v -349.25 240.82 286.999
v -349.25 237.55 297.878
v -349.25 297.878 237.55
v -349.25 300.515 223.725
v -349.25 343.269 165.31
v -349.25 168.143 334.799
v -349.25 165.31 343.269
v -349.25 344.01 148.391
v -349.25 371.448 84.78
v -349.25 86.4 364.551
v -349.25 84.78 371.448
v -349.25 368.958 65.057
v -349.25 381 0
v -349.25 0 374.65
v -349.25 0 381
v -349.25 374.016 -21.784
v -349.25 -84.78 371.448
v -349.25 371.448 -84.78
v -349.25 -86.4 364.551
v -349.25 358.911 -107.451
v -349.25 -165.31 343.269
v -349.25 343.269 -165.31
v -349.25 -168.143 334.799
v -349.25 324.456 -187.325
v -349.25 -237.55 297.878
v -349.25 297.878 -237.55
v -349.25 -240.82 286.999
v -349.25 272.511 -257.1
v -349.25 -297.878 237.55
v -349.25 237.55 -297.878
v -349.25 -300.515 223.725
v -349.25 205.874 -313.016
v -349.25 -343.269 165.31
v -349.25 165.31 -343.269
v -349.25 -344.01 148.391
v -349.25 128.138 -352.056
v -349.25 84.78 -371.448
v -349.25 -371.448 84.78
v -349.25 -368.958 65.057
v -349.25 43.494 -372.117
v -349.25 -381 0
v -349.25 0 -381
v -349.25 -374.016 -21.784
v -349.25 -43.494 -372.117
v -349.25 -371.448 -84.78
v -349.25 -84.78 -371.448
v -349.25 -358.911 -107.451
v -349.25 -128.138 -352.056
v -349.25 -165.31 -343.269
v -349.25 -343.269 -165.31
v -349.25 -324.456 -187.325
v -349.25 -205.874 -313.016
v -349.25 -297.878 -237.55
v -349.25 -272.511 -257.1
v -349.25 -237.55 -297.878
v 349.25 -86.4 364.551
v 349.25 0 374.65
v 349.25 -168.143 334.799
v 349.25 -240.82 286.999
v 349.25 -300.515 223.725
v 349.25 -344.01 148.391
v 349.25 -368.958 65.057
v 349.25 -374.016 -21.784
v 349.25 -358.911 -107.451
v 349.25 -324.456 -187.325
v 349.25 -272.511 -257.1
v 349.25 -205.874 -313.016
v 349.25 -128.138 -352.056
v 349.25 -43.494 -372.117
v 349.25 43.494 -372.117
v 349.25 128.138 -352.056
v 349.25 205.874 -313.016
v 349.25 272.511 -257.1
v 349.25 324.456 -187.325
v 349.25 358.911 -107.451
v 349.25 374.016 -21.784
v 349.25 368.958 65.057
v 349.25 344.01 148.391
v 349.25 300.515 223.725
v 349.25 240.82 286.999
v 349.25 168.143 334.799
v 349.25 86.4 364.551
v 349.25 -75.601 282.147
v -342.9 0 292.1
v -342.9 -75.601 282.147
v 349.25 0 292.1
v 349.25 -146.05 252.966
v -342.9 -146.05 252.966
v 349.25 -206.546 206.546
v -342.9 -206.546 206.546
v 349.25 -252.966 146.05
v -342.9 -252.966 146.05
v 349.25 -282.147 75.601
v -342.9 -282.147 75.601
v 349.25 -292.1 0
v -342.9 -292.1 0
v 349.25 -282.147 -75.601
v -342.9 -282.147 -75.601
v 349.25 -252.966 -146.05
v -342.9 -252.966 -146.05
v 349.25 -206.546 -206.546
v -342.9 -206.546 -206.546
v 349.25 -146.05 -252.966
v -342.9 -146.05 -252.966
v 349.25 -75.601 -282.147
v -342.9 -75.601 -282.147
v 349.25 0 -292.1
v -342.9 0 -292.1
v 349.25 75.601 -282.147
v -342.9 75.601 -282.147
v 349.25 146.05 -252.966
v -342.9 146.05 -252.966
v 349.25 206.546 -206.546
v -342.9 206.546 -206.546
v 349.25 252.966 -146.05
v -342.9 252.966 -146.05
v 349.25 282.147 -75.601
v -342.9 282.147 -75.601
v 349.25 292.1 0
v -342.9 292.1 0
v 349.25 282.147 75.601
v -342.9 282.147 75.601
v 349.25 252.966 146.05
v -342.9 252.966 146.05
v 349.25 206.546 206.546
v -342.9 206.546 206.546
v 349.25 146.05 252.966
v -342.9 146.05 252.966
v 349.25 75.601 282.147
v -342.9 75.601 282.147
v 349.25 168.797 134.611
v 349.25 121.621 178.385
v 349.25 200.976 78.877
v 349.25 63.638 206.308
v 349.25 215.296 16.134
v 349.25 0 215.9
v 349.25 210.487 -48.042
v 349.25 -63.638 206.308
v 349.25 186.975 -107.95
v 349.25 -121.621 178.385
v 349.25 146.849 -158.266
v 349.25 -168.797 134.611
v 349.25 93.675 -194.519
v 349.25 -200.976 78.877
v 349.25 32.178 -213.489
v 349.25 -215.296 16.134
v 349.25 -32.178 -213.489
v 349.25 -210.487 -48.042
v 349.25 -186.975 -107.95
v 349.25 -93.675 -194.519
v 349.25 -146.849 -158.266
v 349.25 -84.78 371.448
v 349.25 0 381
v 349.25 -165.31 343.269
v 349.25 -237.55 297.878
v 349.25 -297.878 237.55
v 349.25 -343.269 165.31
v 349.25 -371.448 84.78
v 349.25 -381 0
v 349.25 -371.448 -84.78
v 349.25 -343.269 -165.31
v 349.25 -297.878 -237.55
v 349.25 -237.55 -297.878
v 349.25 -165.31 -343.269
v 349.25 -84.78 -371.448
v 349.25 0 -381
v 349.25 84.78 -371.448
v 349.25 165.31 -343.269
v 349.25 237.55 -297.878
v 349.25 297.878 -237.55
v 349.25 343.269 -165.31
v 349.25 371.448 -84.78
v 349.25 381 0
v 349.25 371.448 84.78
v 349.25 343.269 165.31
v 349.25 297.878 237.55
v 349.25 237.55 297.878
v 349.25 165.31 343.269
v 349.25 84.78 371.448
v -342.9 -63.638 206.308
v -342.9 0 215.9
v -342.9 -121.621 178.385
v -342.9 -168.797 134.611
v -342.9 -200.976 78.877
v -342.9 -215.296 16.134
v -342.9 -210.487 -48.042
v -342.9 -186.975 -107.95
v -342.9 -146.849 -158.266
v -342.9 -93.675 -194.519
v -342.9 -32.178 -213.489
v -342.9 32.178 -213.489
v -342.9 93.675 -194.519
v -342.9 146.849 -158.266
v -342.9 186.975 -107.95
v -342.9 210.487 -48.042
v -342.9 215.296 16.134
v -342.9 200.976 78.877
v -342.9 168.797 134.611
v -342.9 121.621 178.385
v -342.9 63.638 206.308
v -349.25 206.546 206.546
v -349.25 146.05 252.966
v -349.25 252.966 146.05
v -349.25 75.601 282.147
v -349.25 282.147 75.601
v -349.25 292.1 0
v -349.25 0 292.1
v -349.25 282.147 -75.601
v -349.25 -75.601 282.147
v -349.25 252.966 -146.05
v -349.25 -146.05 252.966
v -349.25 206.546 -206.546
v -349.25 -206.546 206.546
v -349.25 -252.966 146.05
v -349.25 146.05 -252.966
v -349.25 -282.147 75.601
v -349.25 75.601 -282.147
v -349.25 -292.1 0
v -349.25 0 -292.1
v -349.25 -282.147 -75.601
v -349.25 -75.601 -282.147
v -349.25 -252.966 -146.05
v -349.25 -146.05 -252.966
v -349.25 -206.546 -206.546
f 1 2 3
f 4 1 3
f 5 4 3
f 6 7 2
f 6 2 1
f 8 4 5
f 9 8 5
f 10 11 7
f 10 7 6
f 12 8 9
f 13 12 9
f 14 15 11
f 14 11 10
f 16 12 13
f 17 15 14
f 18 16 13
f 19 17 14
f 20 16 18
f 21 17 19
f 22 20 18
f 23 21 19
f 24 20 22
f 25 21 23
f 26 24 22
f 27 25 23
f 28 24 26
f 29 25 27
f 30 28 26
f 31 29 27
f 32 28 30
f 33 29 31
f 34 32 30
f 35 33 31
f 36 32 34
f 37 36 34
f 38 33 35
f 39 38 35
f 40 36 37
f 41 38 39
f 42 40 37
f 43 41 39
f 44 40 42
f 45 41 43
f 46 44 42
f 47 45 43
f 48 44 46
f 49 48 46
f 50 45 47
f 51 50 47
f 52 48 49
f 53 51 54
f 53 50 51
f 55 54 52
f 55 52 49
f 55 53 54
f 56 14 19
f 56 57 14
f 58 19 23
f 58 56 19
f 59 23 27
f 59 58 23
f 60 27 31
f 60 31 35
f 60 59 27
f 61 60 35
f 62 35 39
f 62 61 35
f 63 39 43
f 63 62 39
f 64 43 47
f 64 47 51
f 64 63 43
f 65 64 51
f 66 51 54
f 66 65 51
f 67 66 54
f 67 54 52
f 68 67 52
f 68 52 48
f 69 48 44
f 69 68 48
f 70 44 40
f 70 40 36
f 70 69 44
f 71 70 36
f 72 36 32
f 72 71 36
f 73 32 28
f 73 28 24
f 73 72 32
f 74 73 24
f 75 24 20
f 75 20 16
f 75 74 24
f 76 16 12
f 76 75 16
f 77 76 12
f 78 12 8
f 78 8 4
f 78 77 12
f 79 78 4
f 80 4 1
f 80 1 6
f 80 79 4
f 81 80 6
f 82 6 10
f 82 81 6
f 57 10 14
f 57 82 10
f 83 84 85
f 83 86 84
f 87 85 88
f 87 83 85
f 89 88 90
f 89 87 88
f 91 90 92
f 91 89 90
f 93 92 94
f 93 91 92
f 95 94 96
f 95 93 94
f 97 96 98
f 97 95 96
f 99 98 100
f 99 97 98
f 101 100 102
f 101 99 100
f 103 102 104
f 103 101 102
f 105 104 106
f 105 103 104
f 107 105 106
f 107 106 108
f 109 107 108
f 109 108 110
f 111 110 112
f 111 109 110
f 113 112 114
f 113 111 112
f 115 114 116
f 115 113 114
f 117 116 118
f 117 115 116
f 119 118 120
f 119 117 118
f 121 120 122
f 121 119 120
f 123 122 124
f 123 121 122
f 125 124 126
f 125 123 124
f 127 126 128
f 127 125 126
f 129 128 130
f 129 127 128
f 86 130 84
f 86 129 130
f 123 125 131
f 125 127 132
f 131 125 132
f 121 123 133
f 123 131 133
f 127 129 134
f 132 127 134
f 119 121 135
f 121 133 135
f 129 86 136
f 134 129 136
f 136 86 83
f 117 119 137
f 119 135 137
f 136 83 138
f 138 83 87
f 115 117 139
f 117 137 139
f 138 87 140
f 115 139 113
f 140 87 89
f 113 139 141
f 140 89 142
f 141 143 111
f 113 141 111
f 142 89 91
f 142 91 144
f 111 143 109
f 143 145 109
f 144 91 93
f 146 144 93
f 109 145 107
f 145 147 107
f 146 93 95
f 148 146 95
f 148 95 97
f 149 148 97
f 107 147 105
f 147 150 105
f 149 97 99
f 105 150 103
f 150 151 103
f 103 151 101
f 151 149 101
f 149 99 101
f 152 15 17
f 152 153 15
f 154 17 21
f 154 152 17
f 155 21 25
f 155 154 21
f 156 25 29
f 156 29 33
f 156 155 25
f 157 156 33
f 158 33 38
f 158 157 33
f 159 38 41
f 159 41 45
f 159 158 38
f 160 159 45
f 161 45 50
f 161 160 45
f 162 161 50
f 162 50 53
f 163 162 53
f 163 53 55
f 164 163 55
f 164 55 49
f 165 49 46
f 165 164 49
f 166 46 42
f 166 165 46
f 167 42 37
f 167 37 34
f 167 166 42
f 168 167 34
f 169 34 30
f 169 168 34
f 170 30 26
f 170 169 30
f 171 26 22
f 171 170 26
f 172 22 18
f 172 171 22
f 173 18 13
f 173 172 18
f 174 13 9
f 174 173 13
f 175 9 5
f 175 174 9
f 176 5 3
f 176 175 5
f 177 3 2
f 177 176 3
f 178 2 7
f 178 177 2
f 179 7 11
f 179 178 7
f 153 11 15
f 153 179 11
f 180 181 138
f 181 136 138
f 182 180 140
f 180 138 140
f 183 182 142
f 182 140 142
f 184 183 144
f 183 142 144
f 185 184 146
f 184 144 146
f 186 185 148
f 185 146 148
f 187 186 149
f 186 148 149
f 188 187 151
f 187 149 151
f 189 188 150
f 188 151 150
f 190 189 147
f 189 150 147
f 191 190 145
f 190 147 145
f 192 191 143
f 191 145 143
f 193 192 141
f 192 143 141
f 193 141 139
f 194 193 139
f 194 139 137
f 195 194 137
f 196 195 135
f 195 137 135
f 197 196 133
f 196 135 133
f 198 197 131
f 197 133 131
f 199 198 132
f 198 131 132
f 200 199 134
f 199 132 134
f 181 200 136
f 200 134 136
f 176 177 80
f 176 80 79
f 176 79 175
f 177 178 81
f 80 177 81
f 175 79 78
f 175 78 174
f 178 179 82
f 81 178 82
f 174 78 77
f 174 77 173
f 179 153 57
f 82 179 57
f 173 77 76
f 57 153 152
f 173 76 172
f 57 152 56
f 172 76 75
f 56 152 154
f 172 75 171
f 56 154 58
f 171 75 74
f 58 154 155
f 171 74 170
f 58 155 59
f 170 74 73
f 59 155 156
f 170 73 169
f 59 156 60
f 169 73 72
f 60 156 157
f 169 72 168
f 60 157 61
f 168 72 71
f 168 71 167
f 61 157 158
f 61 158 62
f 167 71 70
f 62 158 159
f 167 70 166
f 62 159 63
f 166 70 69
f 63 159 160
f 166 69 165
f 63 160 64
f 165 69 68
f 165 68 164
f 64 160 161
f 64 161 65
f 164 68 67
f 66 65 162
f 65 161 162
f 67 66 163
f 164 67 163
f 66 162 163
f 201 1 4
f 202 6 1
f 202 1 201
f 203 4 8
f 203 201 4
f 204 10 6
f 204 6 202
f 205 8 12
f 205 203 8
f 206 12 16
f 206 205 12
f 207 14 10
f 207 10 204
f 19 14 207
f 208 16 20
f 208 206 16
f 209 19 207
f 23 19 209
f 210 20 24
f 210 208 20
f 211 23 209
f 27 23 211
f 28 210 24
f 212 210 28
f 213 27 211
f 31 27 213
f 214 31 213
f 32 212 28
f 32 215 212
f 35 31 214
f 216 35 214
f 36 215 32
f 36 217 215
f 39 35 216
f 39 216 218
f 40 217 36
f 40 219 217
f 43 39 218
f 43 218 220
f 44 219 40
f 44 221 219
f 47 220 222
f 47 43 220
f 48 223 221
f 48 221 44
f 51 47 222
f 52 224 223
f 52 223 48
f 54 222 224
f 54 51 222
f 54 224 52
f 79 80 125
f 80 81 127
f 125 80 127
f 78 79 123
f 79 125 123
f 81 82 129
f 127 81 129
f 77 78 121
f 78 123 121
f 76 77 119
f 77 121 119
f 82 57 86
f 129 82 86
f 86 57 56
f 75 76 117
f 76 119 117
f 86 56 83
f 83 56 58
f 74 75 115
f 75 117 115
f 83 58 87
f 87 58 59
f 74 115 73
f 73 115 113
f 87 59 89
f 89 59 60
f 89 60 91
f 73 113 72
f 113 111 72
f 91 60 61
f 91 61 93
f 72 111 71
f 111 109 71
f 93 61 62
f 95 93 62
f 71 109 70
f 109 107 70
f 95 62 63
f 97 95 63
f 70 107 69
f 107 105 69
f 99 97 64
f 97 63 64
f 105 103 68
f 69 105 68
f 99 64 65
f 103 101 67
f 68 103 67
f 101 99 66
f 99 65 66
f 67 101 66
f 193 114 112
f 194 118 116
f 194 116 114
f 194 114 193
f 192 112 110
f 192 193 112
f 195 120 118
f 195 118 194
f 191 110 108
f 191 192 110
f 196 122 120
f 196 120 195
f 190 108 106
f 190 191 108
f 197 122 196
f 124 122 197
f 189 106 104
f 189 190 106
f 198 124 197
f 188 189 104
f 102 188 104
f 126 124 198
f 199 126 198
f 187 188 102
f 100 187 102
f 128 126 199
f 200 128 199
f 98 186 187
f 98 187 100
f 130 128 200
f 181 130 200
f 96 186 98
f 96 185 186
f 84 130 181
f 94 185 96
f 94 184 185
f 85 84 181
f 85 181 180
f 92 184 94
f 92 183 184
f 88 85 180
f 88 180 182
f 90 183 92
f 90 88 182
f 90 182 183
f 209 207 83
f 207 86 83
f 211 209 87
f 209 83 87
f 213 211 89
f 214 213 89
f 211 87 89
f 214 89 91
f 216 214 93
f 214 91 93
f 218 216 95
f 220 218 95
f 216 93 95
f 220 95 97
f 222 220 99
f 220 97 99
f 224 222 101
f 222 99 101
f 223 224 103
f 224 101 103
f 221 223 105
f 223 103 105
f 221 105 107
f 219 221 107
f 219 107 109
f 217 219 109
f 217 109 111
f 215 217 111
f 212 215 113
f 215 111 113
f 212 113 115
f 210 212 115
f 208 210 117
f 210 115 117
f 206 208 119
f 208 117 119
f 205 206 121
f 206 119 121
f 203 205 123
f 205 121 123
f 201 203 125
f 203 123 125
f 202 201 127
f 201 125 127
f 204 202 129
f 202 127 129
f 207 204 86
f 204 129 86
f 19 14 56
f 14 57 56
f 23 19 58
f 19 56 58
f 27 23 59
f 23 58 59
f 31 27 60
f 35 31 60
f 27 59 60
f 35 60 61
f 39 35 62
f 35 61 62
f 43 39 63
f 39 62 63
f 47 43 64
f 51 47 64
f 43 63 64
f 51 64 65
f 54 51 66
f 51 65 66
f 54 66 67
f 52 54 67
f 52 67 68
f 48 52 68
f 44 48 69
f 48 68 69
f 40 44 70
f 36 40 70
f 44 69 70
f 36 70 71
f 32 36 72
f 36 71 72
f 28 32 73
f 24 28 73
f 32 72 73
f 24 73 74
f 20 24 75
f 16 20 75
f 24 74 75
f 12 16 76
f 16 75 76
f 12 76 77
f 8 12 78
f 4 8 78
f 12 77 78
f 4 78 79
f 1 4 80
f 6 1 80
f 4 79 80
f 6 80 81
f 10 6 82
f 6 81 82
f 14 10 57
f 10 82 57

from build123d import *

# Parameters (mm, degrees)
F0_W        = 698.5
F0_H        = 76.2
F0_H_2      = 82.55
F0_H_3      = 6.35
F1_FACE_R   = 292.1
F1_FACE_R_2 = 215.9
F4_DEPTH    = 6.35


with BuildPart() as f1:
    # F0 (on Front) → F1 (revolve)
    with BuildSketch(Plane.XZ):
        with Locations((0, 254)):
            Rectangle(F0_W, F0_H)
    revolve(axis=Axis((0, 0, 0), (1, 0, 0)))

    # F1_face (on face) → F4 (cut)
    with BuildSketch(Plane(origin=(-349.25, 0, 0), x_dir=(0, -1, 0), z_dir=(-1, 0, 0))):
        Circle(F1_FACE_R)
        Circle(F1_FACE_R_2, mode=Mode.SUBTRACT)
    extrude(amount=-F4_DEPTH, mode=Mode.SUBTRACT)


with BuildPart() as f2:
    # F0 (on Front) → F2 (revolve)
    with BuildSketch(Plane.XZ):
        with Locations((0, 333.375)):
            Rectangle(F0_W, F0_H_2)
    revolve(axis=Axis((0, 0, 0), (1, 0, 0)))


with BuildPart() as f3:
    # F0 (on Front) → F3 (revolve)
    with BuildSketch(Plane.XZ):
        with Locations((0, 377.825)):
            Rectangle(F0_W, F0_H_3)
    revolve(axis=Axis((0, 0, 0), (1, 0, 0)))


solid = Compound([f1.part, f2.part, f3.part])
